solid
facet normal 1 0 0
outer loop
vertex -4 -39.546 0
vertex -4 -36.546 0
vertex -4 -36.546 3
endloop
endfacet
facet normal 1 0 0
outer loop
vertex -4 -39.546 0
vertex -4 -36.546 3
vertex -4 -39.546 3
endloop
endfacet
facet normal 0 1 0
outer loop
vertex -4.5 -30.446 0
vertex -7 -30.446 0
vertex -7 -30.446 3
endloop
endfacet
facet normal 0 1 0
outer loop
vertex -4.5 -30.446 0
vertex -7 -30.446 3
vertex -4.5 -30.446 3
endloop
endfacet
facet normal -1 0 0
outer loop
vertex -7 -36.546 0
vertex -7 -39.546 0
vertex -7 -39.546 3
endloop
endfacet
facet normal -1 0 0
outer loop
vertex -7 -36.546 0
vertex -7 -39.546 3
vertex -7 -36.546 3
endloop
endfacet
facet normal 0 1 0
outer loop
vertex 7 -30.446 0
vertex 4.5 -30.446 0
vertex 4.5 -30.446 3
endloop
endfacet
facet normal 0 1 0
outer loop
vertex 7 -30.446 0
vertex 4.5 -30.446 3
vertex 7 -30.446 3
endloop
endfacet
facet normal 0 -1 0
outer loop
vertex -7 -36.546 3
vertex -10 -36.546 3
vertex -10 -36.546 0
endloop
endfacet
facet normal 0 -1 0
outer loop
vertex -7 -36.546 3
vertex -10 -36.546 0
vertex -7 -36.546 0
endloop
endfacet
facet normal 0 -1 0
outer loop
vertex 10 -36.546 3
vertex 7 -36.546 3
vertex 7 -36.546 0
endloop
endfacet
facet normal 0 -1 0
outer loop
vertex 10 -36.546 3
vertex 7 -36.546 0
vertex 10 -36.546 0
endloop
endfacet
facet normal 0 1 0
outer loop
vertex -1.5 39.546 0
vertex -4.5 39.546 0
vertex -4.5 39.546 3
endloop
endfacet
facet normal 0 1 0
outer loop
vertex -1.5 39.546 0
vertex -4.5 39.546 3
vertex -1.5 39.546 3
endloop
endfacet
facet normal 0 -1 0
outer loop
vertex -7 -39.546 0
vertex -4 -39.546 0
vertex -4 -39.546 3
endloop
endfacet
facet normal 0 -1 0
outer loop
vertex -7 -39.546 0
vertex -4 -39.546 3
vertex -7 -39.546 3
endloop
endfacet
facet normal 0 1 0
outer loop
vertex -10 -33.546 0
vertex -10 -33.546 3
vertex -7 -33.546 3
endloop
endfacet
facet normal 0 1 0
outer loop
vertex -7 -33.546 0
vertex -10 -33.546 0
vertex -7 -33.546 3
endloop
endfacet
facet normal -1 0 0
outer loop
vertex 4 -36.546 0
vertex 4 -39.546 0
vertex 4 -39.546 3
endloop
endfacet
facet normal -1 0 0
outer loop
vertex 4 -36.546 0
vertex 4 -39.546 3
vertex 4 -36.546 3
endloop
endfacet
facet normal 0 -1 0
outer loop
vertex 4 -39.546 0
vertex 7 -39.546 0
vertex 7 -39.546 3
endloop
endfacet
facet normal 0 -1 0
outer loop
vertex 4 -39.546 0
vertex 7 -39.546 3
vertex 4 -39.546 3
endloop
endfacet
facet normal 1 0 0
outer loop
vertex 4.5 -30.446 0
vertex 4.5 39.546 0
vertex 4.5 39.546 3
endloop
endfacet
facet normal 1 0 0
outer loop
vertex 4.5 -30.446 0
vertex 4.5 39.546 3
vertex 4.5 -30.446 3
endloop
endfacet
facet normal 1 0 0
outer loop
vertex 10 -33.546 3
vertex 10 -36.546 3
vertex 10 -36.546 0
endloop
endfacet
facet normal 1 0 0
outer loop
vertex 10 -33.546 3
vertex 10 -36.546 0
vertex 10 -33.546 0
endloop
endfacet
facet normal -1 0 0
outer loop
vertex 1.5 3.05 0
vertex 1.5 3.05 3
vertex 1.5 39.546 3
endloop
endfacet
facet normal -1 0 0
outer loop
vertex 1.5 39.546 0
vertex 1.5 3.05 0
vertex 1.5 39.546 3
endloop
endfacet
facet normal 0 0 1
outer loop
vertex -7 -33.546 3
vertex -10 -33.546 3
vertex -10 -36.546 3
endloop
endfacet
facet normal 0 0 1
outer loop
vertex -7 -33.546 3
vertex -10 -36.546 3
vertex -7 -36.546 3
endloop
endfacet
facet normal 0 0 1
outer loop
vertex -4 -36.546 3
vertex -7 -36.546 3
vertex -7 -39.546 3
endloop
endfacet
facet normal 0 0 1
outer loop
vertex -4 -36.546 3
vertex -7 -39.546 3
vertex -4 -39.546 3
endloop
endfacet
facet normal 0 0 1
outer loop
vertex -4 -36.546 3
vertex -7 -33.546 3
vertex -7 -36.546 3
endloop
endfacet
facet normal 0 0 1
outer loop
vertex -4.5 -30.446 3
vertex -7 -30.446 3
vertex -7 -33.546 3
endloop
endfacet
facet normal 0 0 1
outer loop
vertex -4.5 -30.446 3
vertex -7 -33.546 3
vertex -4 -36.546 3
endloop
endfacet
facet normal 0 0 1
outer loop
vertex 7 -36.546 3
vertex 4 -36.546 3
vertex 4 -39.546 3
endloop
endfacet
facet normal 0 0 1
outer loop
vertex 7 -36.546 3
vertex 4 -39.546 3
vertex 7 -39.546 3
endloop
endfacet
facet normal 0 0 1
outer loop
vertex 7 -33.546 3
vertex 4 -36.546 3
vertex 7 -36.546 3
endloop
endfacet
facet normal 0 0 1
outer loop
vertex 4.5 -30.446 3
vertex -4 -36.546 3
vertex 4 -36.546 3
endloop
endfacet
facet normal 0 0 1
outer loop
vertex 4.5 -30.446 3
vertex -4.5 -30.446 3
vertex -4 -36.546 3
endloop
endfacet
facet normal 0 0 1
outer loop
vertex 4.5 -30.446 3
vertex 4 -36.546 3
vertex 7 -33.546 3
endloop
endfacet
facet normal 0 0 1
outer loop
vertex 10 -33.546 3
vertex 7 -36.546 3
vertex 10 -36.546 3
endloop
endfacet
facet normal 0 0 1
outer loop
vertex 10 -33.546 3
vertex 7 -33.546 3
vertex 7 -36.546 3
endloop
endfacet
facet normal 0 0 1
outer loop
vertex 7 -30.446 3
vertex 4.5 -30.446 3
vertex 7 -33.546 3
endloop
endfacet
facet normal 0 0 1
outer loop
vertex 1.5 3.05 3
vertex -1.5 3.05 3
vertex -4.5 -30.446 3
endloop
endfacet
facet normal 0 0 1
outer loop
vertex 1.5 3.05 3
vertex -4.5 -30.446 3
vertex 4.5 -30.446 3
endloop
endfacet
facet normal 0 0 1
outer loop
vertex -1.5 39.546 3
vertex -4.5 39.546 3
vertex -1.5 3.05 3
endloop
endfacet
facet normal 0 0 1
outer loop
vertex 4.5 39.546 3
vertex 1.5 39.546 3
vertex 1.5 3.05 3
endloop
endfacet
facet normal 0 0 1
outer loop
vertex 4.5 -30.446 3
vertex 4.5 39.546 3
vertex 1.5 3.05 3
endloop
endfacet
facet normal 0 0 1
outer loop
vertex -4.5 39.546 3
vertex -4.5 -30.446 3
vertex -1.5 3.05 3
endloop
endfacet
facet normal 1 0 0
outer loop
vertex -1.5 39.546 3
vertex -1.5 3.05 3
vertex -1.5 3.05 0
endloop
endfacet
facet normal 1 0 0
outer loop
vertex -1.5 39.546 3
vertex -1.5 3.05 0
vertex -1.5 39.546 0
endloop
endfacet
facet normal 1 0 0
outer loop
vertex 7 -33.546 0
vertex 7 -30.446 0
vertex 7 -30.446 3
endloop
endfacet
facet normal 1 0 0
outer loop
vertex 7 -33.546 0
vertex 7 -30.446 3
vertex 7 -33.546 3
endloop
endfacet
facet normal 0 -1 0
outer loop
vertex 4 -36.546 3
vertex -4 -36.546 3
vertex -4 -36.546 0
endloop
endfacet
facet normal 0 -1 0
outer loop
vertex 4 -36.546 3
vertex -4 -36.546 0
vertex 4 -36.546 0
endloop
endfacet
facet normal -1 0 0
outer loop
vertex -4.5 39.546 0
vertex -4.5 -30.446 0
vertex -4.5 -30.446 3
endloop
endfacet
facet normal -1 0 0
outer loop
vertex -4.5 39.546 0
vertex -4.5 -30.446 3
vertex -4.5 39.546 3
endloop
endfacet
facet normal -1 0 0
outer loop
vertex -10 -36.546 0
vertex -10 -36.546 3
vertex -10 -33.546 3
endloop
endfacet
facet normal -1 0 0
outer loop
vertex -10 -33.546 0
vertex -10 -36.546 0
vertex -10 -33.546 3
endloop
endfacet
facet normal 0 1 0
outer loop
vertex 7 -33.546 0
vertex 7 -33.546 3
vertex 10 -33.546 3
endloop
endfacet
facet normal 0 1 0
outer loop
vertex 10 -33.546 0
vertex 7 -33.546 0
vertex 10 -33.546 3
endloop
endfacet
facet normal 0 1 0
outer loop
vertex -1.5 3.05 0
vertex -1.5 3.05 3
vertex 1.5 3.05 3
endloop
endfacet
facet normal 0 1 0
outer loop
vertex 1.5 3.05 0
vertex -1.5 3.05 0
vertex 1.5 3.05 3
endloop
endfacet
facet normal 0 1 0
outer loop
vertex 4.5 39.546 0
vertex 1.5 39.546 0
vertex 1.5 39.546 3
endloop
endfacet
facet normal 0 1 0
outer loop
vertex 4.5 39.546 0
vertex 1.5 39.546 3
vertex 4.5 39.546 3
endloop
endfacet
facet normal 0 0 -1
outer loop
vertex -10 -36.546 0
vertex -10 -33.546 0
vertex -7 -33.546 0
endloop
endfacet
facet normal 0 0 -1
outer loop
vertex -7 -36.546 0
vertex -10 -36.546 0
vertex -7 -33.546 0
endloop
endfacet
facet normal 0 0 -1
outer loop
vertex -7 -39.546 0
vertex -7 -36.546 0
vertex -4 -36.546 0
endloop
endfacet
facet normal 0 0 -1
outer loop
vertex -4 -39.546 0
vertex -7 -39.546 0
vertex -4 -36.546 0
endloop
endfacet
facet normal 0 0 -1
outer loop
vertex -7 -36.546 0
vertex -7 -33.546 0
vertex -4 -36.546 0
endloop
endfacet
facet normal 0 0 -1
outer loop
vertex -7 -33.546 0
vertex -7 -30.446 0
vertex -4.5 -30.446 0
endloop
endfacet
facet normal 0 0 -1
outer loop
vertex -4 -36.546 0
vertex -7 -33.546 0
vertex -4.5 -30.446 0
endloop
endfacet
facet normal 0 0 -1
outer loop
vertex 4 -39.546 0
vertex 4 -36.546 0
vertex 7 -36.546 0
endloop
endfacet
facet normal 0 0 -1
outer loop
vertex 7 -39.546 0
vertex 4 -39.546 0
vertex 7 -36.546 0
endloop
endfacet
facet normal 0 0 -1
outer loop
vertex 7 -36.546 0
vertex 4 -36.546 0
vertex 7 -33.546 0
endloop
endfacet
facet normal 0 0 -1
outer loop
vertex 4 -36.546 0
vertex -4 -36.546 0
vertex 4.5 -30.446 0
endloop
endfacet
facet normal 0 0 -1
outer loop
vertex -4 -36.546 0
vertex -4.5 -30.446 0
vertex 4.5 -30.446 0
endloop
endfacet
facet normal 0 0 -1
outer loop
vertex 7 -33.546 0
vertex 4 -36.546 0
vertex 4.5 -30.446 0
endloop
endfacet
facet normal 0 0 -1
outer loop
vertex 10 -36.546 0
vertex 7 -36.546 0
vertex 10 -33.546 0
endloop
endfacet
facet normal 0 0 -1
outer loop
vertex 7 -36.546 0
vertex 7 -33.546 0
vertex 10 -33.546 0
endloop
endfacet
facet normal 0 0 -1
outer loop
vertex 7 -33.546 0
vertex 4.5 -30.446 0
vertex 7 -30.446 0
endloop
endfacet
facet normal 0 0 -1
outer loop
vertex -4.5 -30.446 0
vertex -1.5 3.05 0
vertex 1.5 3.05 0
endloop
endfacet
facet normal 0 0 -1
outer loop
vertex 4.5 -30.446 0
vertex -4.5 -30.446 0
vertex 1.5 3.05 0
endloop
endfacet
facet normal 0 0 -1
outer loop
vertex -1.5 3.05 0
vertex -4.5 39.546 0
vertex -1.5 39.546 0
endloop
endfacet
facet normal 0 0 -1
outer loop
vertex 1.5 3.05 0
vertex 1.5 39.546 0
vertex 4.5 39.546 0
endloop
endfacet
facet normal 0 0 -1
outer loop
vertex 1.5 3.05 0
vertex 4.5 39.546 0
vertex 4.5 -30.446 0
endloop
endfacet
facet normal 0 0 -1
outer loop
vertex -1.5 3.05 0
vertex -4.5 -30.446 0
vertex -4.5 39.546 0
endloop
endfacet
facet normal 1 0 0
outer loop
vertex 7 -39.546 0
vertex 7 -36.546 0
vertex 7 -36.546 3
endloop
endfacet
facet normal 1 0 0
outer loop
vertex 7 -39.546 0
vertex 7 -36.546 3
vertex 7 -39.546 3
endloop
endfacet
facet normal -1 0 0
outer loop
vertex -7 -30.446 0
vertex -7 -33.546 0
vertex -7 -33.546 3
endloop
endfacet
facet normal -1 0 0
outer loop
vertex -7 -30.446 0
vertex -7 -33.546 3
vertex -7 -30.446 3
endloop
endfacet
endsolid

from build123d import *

# Parameters (mm, degrees)
EXTRUDE_1_DEPTH     = 3
SKETCH_2_W          = 3
SKETCH_2_H          = 36.495999937
CUT_EXTRUDE_1_DEPTH = 3
SKETCH_3_W          = 3
SKETCH_3_H          = 3
EXTRUDE_2_DEPTH     = 3
SKETCH_4_W          = 8
SKETCH_4_H          = 3.1
EXTRUDE_3_DEPTH     = 3


with BuildPart() as part:
    # 스케치1 → 보스-돌출1 (new body)
    with BuildSketch(Plane.XY):
        Polygon((-4.5, 39.545999937), (4.5, 39.545999937), (4.5, -30.445999937), (7, -30.445999937), (7, -39.545999937), (4, -39.545999937), (4, -33.445999937), (-4, -33.445999937), (-4, -39.545999937), (-7, -39.545999937), (-7, -30.445999937), (-4.5, -30.445999937), align=None)
    extrude(amount=EXTRUDE_1_DEPTH)

    # 스케치2 → 컷-돌출1 (cut)
    with BuildSketch(Plane.XY.offset(3)):
        with Locations((0, 21.297999969)):
            Rectangle(SKETCH_2_W, SKETCH_2_H)
    extrude(amount=-CUT_EXTRUDE_1_DEPTH, mode=Mode.SUBTRACT)

    # 스케치3 → 보스-돌출2 (add)
    with BuildSketch(Plane.XY.offset(3)):
        with Locations((-8.5, -35.045999937)):
            Rectangle(SKETCH_3_W, SKETCH_3_H)
        with Locations((8.5, -35.045999937)):
            Rectangle(SKETCH_3_W, SKETCH_3_H)
    extrude(amount=-EXTRUDE_2_DEPTH)

    # 스케치4 → 보스-돌출3 (add)
    with BuildSketch(Plane.XY.offset(3)):
        with Locations((0, -34.995999937)):
            Rectangle(SKETCH_4_W, SKETCH_4_H)
    extrude(amount=-EXTRUDE_3_DEPTH)


solid = part.part
